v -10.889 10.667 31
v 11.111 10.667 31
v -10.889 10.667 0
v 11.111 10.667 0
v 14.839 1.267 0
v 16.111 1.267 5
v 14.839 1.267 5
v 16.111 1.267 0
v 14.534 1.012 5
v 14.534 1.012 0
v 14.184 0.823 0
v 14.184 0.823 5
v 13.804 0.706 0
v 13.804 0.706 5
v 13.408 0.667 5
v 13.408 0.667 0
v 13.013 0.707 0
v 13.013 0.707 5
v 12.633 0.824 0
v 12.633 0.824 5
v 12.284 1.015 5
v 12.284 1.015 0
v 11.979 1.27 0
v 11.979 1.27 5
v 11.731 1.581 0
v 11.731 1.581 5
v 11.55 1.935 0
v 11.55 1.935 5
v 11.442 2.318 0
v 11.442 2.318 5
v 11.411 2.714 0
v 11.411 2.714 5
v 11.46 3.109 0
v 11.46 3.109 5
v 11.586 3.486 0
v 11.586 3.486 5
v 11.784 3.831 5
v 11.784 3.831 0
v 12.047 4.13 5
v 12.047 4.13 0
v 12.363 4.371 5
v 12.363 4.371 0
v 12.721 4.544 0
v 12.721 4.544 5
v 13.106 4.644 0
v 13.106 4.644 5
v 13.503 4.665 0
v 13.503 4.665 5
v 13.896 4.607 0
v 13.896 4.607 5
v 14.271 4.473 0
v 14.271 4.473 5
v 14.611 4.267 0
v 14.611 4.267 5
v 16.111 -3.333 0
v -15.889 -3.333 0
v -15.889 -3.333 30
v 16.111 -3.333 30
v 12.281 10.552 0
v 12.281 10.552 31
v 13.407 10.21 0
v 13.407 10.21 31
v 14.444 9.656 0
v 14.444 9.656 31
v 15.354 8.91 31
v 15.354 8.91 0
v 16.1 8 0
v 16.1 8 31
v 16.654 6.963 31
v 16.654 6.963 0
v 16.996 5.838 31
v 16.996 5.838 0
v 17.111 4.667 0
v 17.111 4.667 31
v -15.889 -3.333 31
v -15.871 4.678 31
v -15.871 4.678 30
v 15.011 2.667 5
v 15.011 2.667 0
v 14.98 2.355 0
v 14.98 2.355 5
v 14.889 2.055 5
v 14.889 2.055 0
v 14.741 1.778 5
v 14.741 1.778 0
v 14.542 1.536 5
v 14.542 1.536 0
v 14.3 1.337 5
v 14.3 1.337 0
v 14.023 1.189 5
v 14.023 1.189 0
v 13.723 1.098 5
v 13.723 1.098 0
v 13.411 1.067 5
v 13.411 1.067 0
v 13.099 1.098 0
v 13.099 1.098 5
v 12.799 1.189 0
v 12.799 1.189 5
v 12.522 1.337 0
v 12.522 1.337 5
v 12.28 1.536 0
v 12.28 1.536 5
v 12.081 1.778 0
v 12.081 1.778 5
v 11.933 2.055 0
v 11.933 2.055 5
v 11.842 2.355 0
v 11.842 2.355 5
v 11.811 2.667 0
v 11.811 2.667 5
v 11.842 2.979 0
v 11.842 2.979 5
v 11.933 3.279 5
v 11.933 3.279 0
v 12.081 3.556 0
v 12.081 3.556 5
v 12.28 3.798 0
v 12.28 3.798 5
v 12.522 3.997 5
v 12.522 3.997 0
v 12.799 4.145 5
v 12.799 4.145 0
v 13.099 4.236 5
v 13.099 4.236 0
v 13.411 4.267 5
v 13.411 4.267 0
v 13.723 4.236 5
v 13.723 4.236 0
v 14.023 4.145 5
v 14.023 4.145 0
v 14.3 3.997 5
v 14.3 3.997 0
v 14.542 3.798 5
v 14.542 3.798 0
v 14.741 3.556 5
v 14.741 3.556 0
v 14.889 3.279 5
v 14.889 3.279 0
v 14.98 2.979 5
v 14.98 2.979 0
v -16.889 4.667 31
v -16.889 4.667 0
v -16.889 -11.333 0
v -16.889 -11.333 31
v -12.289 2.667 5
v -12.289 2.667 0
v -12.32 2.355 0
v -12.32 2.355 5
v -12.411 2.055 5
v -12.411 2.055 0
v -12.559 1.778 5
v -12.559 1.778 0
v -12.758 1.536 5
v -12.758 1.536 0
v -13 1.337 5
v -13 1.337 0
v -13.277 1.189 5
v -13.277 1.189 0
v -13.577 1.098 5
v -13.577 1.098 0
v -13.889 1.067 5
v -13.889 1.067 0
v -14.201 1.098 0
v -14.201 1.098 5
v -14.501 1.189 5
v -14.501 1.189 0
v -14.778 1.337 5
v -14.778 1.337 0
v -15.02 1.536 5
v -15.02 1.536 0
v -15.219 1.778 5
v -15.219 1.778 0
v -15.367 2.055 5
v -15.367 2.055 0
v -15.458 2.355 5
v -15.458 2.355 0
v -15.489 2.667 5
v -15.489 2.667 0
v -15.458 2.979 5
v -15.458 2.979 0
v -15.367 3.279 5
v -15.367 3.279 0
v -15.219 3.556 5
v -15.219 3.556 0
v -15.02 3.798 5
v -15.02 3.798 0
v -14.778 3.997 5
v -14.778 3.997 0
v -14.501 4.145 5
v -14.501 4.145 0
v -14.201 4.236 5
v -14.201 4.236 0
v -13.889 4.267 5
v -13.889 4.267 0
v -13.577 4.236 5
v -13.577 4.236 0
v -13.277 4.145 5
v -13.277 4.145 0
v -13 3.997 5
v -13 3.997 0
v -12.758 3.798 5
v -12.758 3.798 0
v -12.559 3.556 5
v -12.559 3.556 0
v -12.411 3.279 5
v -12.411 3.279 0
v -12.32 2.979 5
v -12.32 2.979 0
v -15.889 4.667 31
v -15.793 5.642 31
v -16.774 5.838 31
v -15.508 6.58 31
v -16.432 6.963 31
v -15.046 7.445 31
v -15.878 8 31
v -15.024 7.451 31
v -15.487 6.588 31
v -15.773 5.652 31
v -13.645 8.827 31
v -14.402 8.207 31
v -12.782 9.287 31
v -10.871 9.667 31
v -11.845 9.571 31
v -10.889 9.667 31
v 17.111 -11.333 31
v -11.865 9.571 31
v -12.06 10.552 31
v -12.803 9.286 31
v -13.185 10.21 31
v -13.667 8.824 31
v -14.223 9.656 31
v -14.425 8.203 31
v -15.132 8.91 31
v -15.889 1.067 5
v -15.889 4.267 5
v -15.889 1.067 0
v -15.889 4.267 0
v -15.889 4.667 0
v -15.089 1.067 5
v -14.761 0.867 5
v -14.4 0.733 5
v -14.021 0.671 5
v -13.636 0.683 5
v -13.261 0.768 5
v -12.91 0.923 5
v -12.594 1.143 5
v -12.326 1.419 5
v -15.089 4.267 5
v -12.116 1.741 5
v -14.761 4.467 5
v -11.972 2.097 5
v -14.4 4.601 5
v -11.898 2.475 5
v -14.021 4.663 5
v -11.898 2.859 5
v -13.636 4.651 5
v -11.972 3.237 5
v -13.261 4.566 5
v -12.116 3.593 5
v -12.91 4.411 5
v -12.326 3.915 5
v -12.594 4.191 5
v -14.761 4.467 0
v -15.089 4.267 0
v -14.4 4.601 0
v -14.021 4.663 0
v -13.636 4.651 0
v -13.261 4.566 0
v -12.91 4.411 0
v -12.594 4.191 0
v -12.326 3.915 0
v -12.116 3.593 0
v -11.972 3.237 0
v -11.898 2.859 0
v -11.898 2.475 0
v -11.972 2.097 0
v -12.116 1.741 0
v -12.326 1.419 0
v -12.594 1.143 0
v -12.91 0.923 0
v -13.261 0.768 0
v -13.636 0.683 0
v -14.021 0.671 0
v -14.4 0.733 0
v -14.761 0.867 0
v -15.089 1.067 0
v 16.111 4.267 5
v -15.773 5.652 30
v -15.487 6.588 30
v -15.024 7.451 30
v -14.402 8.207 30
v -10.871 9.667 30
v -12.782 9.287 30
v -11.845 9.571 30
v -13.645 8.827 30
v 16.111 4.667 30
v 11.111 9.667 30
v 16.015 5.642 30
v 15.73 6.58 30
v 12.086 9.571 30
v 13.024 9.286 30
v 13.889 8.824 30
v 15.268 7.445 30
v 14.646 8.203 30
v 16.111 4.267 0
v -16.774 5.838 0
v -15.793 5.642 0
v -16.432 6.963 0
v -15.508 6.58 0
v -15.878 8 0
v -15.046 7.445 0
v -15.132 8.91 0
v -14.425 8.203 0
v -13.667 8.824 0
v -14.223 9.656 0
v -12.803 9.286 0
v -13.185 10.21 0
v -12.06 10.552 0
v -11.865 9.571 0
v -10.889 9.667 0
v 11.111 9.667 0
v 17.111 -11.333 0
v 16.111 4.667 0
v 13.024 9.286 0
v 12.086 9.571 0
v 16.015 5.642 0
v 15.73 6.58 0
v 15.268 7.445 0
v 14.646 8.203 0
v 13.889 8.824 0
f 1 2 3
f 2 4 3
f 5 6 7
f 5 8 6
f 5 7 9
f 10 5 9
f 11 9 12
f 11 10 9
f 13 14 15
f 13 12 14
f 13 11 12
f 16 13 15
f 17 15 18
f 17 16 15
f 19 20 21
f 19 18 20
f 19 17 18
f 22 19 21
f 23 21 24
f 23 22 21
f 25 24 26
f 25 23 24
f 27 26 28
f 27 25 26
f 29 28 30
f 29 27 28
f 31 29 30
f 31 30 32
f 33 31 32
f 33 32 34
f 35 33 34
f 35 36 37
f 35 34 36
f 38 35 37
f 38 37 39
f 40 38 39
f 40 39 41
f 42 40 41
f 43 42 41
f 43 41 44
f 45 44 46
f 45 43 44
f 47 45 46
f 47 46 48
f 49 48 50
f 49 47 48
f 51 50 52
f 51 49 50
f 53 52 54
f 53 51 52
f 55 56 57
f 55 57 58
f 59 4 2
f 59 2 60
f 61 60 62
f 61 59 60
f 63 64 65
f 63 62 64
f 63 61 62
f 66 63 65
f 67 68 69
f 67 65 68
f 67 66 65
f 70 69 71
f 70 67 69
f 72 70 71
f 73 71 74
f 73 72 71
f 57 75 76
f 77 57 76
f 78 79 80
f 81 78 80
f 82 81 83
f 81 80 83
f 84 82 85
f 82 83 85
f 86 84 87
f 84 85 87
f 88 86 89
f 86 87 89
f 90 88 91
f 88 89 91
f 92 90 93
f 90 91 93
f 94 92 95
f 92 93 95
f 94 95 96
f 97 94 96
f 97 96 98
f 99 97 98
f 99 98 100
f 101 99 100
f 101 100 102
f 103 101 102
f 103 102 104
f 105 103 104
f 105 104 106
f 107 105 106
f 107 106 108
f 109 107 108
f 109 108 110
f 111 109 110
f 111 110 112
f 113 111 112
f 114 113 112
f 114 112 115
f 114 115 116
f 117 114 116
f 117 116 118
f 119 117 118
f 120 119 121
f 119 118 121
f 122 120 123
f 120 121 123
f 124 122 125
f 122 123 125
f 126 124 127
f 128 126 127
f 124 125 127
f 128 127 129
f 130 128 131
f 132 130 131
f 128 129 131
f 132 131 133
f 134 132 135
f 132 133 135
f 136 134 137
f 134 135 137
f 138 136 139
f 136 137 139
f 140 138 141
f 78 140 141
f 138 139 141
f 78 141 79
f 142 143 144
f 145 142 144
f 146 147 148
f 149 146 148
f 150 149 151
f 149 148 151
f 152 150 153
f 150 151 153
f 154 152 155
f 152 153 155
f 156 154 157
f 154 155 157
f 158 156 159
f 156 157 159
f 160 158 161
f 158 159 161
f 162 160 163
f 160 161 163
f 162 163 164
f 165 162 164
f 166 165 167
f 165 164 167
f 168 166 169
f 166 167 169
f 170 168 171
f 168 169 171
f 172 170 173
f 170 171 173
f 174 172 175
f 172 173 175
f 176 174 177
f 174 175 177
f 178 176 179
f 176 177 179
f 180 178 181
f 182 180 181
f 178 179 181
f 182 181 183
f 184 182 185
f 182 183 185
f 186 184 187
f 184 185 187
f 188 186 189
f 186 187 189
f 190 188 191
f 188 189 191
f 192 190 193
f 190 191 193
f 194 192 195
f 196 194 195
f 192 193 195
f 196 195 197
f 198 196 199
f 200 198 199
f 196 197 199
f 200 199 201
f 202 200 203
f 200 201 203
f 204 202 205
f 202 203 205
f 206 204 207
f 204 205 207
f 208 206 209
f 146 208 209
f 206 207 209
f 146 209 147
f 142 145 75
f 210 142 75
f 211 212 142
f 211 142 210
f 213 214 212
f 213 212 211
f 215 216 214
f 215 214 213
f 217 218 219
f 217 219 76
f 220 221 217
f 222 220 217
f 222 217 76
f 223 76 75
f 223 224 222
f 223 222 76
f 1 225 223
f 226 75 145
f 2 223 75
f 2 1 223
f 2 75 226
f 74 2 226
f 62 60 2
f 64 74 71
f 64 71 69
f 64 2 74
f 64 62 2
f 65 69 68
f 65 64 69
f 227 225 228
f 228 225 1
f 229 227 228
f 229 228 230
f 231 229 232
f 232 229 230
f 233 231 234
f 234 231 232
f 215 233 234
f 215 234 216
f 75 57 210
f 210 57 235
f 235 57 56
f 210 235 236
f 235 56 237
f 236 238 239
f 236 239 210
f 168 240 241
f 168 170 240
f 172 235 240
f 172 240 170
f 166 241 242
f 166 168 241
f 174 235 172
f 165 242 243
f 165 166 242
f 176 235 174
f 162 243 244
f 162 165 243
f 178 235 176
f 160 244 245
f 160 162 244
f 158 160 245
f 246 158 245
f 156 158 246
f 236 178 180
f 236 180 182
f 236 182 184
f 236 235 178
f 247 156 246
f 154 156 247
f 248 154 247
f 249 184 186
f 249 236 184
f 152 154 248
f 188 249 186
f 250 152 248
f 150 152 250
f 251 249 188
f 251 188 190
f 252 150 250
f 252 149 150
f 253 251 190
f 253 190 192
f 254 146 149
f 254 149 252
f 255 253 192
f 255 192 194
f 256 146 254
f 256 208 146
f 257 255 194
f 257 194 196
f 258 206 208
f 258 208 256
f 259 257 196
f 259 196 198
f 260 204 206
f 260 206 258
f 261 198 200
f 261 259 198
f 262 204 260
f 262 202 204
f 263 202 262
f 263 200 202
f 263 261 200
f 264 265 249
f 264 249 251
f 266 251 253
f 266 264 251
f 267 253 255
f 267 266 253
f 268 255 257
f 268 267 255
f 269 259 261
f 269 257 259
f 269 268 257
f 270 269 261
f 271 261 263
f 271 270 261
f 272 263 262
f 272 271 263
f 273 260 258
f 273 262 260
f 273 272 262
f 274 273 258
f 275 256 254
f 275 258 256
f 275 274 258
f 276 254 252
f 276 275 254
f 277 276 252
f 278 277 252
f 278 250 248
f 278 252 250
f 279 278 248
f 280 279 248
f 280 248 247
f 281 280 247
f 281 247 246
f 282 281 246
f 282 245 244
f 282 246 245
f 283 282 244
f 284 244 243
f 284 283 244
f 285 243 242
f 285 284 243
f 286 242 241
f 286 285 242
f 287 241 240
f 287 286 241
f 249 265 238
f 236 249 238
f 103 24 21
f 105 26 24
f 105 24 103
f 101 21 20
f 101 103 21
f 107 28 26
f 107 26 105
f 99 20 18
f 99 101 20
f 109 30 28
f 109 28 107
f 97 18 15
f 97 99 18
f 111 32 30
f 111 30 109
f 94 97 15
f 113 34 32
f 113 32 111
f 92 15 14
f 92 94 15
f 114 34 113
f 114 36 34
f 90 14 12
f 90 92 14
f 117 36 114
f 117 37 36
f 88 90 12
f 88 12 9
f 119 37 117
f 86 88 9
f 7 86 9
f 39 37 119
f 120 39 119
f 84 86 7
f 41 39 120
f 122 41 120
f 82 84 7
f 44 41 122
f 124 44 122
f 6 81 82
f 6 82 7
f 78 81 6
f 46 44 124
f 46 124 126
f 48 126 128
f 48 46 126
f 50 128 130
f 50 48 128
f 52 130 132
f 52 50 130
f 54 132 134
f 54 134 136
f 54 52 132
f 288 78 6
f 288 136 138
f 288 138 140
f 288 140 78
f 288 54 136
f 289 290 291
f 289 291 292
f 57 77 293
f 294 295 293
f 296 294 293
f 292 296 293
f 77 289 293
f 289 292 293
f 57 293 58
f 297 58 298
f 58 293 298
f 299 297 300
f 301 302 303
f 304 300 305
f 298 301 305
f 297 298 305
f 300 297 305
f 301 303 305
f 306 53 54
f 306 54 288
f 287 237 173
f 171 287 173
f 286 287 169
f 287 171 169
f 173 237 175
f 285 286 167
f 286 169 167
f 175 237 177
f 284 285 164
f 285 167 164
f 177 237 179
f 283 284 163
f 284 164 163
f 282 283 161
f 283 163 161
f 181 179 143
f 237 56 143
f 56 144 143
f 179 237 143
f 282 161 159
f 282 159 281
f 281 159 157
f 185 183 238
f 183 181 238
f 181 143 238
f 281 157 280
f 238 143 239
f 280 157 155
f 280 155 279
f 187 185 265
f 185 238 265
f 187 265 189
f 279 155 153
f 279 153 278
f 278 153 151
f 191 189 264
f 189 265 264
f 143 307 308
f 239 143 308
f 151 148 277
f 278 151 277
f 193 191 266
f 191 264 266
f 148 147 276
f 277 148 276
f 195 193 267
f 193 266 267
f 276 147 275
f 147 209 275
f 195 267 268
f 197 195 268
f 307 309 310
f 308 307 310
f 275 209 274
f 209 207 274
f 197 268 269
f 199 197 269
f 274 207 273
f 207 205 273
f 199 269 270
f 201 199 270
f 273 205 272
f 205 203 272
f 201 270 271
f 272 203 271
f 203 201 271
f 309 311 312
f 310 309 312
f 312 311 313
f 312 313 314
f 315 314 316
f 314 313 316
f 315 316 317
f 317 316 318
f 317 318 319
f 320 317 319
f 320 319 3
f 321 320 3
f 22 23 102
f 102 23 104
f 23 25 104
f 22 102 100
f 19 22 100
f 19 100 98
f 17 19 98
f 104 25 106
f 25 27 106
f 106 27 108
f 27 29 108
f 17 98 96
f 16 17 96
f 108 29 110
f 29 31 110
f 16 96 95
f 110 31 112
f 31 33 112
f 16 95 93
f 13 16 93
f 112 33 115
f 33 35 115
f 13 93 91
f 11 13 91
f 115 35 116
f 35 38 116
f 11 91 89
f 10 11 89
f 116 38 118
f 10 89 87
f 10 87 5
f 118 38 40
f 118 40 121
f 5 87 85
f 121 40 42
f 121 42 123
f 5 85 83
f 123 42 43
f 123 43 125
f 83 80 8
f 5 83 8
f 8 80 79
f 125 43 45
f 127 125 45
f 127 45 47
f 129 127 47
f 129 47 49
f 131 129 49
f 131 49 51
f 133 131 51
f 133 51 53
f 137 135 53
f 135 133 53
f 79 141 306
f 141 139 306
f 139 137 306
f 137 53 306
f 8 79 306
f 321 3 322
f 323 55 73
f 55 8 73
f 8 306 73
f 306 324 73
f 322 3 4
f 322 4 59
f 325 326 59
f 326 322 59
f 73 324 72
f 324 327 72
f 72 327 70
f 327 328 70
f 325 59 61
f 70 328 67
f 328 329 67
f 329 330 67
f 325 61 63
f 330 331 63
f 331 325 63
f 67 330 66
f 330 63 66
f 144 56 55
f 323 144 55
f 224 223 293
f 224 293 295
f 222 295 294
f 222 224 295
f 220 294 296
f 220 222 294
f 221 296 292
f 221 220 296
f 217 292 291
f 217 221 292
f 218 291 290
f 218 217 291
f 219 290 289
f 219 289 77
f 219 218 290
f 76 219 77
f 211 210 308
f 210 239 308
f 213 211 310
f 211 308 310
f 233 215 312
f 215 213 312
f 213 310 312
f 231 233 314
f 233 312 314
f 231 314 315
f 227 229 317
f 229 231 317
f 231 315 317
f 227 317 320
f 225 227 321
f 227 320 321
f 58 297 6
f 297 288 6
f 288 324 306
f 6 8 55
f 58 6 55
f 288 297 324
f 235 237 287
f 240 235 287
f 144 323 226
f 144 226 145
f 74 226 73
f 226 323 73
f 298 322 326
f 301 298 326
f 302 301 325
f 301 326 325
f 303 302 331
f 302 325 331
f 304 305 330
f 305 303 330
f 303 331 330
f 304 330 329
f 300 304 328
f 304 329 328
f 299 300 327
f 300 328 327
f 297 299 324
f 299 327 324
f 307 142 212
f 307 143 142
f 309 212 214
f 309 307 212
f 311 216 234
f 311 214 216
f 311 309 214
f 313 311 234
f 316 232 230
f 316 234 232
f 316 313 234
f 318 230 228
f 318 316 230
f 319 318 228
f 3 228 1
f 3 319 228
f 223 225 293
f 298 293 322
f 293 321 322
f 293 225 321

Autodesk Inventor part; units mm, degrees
ref_plane "YZ Plane" through (0, 0, 0) normal (1, 0, 0) x (0, 1, 0)
ref_plane "XZ Plane" through (0, 0, 0) normal (0, 1, 0) x (-1, 0, 0)
sketch "Sketch1" plane through (0, 0, 0) normal (0, 0, 1) x (1, 0, 0)
  line L0 (11.1109, 10.667) -> (-10.8891, 10.667)
  arc A0 (17.1109, 4.667) -> (11.1109, 10.667) centre (11.1109, 4.667) ccw
  arc A1 (-10.8891, 10.667) -> (-16.8891, 4.667) centre (-10.8891, 4.667) ccw
  line L1 (17.1109, -11.333) -> (17.1109, 4.667)
  arc A2 (17.1109, 4.667) -> (11.1109, 10.667) centre (11.1109, 4.667) ccw
  line L2 (11.1109, 10.667) -> (-10.8891, 10.667)
  arc A3 (-10.8891, 10.667) -> (-16.8891, 4.667) centre (-10.8891, 4.667) ccw
  line L3 (-16.8891, 4.667) -> (-16.8891, -11.333)
  line L4 (16.1109, 4.667) -> (16.1109, -11.333)
  line L5 (17.1109, -11.333) -> (-16.8891, -11.333)
  line L6 (-15.8891, -11.333) -> (-15.8891, 4.667)
  arc A4 (-10.8891, 9.667) -> (-15.8891, 4.667) centre (-10.8891, 4.667) ccw
  line L7 (-10.8891, 9.667) -> (11.1109, 9.667)
  arc A5 (16.1109, 4.667) -> (11.1109, 9.667) centre (11.1109, 4.667) ccw
  line L8 (-16.8891, -3.333) -> (17.1109, -3.333)
  line L9 (-15.8891, -3.333) -> (-15.8891, 7.1792)
  line L10 (-15.8891, 2.667) -> (-13.8891, 2.667)
  line L11 (16.1109, -3.333) -> (-15.8891, -3.333)
  circle A6 centre (-13.8891, 2.667) radius 2
  line L12 (20.9541, 5.1792) -> (19.218, 5.1792)
  circle A7 centre (-13.8891, 2.667) radius 1.6
  line L13 (-13.8891, 4.267) -> (-15.8891, 4.267)
  line L14 (-15.8891, 4.267) -> (-15.8891, 1.067)
  line L15 (-15.8891, 1.067) -> (-13.8891, 1.067)
  line L16 (-13.8891, 1.067) -> (-13.8891, 4.267)
  circle A8 centre (13.4109, 2.667) radius 2
  circle A9 centre (13.4109, 2.667) radius 1.6
  line L17 (16.1109, 4.667) -> (16.1109, -3.333)
  line L18 (13.4109, 4.267) -> (16.1109, 4.267)
  line L19 (16.1109, 4.267) -> (16.1109, 1.267)
  line L20 (16.1109, 1.267) -> (13.4109, 1.267)
  line L21 (13.4109, 1.267) -> (13.4109, 4.267)
  point P0 (0, 0)
  point P1 (16.1109, -3.333)
  point P2 (-15.8891, -3.333)
  point P3 (17.1109, 4.667)
  point P4 (-16.8891, 4.667)
  point P5 (-13.8891, 2.667)
  point P6 (-15.8891, 1.067)
  point P7 (-15.0891, 1.067)
  point P8 (-15.0891, 4.267)
  point P9 (-15.8891, 4.267)
  point P10 (14.8392, 1.267)
  point P11 (16.1109, 1.267)
  point P12 (16.1109, 4.267)
  point P13 (14.6109, 4.267)
  dimension "d16" = 3.2
  dimension "d18" = 3.2
  dimension "d19" = 27.3
  dimension "d0" = 1
  dimension "d3" = 22
  dimension "d4" = 34
  dimension "d5" = 16
  dimension "d6" = 6
  dimension "d7" = 5
  dimension "d8" = 9.667
  dimension "d9" = 10.667
  dimension "d10" = 11.333
  dimension "d11" = 8
  dimension "d12" = 22
  dimension "d13" = 34
  dimension "d14" = 6
  dimension "d15" = 4
  dimension "d17" = 4
  dimension "d20" = 0
  dimension "d21" = 0
extrude "Extrusion1" add sketch "Sketch1" along normal blind 31 contours A0 L1 L8 L4 A5 L7 A4 L6 L3 A1 L0 | L1 L5 L4 L8 | L8 L6 L5 L3 | L4 L5 L6 L8
extrude "Extrusion2" add sketch "Sketch1" along normal blind 5 contours L20 A8 L18 L4 | L6 A6 L15 | L20 A9 L18 A8 | A8 L18 A9 L20 | A6 L13 A7 L10 | L6 L13 A6 | L10 A7 L15 A6 | L15 A7 L13 A6
ref_plane "Work Plane1" through (0, 0, 31) normal (0, 0, -1) x (-1, 0, 0)
sketch "Sketch2" plane through (0, 0, 31) normal (0, 0, 1) x (1, 0, 0)
  line L0 (-15.8891, -3.333) -> (-15.8891, 1.067) projected
  line L1 (-15.8891, -3.333) -> (-15.8891, 5)
  line L2 (16.1109, -3.333) -> (-15.8891, -3.333) projected
  line L3 (-15.8891, -3.333) -> (16.1109, -3.333)
  line L4 (16.1109, -3.333) -> (16.1109, 4.667)
  arc A0 (16.1109, 4.667) -> (11.1109, 9.667) centre (11.1109, 4.667) ccw projected
  circle A1 centre (11.1109, 4.667) radius 5
  circle A2 centre (-10.8708, 4.667) radius 5
  line L5 (-10.8708, 10.6741) -> (11.1109, 10.6741)
  line L6 (-10.8708, 9.667) -> (11.1109, 9.667)
  line L7 (-10.8708, 9.667) -> (11.1109, 9.667)
  line L8 (-15.8891, -3.333) -> (16.1109, -3.333)
  line L9 (16.1109, 4.667) -> (16.1109, -3.333)
  line L10 (-15.8891, -3.333) -> (-15.8708, 4.6784)
  point P0 (0, 0)
  dimension "d25" = 10
extrude "Extrusion3" add sketch "Sketch2" against normal blind 1
properties part number "SERVO.housing_3DPrint"
